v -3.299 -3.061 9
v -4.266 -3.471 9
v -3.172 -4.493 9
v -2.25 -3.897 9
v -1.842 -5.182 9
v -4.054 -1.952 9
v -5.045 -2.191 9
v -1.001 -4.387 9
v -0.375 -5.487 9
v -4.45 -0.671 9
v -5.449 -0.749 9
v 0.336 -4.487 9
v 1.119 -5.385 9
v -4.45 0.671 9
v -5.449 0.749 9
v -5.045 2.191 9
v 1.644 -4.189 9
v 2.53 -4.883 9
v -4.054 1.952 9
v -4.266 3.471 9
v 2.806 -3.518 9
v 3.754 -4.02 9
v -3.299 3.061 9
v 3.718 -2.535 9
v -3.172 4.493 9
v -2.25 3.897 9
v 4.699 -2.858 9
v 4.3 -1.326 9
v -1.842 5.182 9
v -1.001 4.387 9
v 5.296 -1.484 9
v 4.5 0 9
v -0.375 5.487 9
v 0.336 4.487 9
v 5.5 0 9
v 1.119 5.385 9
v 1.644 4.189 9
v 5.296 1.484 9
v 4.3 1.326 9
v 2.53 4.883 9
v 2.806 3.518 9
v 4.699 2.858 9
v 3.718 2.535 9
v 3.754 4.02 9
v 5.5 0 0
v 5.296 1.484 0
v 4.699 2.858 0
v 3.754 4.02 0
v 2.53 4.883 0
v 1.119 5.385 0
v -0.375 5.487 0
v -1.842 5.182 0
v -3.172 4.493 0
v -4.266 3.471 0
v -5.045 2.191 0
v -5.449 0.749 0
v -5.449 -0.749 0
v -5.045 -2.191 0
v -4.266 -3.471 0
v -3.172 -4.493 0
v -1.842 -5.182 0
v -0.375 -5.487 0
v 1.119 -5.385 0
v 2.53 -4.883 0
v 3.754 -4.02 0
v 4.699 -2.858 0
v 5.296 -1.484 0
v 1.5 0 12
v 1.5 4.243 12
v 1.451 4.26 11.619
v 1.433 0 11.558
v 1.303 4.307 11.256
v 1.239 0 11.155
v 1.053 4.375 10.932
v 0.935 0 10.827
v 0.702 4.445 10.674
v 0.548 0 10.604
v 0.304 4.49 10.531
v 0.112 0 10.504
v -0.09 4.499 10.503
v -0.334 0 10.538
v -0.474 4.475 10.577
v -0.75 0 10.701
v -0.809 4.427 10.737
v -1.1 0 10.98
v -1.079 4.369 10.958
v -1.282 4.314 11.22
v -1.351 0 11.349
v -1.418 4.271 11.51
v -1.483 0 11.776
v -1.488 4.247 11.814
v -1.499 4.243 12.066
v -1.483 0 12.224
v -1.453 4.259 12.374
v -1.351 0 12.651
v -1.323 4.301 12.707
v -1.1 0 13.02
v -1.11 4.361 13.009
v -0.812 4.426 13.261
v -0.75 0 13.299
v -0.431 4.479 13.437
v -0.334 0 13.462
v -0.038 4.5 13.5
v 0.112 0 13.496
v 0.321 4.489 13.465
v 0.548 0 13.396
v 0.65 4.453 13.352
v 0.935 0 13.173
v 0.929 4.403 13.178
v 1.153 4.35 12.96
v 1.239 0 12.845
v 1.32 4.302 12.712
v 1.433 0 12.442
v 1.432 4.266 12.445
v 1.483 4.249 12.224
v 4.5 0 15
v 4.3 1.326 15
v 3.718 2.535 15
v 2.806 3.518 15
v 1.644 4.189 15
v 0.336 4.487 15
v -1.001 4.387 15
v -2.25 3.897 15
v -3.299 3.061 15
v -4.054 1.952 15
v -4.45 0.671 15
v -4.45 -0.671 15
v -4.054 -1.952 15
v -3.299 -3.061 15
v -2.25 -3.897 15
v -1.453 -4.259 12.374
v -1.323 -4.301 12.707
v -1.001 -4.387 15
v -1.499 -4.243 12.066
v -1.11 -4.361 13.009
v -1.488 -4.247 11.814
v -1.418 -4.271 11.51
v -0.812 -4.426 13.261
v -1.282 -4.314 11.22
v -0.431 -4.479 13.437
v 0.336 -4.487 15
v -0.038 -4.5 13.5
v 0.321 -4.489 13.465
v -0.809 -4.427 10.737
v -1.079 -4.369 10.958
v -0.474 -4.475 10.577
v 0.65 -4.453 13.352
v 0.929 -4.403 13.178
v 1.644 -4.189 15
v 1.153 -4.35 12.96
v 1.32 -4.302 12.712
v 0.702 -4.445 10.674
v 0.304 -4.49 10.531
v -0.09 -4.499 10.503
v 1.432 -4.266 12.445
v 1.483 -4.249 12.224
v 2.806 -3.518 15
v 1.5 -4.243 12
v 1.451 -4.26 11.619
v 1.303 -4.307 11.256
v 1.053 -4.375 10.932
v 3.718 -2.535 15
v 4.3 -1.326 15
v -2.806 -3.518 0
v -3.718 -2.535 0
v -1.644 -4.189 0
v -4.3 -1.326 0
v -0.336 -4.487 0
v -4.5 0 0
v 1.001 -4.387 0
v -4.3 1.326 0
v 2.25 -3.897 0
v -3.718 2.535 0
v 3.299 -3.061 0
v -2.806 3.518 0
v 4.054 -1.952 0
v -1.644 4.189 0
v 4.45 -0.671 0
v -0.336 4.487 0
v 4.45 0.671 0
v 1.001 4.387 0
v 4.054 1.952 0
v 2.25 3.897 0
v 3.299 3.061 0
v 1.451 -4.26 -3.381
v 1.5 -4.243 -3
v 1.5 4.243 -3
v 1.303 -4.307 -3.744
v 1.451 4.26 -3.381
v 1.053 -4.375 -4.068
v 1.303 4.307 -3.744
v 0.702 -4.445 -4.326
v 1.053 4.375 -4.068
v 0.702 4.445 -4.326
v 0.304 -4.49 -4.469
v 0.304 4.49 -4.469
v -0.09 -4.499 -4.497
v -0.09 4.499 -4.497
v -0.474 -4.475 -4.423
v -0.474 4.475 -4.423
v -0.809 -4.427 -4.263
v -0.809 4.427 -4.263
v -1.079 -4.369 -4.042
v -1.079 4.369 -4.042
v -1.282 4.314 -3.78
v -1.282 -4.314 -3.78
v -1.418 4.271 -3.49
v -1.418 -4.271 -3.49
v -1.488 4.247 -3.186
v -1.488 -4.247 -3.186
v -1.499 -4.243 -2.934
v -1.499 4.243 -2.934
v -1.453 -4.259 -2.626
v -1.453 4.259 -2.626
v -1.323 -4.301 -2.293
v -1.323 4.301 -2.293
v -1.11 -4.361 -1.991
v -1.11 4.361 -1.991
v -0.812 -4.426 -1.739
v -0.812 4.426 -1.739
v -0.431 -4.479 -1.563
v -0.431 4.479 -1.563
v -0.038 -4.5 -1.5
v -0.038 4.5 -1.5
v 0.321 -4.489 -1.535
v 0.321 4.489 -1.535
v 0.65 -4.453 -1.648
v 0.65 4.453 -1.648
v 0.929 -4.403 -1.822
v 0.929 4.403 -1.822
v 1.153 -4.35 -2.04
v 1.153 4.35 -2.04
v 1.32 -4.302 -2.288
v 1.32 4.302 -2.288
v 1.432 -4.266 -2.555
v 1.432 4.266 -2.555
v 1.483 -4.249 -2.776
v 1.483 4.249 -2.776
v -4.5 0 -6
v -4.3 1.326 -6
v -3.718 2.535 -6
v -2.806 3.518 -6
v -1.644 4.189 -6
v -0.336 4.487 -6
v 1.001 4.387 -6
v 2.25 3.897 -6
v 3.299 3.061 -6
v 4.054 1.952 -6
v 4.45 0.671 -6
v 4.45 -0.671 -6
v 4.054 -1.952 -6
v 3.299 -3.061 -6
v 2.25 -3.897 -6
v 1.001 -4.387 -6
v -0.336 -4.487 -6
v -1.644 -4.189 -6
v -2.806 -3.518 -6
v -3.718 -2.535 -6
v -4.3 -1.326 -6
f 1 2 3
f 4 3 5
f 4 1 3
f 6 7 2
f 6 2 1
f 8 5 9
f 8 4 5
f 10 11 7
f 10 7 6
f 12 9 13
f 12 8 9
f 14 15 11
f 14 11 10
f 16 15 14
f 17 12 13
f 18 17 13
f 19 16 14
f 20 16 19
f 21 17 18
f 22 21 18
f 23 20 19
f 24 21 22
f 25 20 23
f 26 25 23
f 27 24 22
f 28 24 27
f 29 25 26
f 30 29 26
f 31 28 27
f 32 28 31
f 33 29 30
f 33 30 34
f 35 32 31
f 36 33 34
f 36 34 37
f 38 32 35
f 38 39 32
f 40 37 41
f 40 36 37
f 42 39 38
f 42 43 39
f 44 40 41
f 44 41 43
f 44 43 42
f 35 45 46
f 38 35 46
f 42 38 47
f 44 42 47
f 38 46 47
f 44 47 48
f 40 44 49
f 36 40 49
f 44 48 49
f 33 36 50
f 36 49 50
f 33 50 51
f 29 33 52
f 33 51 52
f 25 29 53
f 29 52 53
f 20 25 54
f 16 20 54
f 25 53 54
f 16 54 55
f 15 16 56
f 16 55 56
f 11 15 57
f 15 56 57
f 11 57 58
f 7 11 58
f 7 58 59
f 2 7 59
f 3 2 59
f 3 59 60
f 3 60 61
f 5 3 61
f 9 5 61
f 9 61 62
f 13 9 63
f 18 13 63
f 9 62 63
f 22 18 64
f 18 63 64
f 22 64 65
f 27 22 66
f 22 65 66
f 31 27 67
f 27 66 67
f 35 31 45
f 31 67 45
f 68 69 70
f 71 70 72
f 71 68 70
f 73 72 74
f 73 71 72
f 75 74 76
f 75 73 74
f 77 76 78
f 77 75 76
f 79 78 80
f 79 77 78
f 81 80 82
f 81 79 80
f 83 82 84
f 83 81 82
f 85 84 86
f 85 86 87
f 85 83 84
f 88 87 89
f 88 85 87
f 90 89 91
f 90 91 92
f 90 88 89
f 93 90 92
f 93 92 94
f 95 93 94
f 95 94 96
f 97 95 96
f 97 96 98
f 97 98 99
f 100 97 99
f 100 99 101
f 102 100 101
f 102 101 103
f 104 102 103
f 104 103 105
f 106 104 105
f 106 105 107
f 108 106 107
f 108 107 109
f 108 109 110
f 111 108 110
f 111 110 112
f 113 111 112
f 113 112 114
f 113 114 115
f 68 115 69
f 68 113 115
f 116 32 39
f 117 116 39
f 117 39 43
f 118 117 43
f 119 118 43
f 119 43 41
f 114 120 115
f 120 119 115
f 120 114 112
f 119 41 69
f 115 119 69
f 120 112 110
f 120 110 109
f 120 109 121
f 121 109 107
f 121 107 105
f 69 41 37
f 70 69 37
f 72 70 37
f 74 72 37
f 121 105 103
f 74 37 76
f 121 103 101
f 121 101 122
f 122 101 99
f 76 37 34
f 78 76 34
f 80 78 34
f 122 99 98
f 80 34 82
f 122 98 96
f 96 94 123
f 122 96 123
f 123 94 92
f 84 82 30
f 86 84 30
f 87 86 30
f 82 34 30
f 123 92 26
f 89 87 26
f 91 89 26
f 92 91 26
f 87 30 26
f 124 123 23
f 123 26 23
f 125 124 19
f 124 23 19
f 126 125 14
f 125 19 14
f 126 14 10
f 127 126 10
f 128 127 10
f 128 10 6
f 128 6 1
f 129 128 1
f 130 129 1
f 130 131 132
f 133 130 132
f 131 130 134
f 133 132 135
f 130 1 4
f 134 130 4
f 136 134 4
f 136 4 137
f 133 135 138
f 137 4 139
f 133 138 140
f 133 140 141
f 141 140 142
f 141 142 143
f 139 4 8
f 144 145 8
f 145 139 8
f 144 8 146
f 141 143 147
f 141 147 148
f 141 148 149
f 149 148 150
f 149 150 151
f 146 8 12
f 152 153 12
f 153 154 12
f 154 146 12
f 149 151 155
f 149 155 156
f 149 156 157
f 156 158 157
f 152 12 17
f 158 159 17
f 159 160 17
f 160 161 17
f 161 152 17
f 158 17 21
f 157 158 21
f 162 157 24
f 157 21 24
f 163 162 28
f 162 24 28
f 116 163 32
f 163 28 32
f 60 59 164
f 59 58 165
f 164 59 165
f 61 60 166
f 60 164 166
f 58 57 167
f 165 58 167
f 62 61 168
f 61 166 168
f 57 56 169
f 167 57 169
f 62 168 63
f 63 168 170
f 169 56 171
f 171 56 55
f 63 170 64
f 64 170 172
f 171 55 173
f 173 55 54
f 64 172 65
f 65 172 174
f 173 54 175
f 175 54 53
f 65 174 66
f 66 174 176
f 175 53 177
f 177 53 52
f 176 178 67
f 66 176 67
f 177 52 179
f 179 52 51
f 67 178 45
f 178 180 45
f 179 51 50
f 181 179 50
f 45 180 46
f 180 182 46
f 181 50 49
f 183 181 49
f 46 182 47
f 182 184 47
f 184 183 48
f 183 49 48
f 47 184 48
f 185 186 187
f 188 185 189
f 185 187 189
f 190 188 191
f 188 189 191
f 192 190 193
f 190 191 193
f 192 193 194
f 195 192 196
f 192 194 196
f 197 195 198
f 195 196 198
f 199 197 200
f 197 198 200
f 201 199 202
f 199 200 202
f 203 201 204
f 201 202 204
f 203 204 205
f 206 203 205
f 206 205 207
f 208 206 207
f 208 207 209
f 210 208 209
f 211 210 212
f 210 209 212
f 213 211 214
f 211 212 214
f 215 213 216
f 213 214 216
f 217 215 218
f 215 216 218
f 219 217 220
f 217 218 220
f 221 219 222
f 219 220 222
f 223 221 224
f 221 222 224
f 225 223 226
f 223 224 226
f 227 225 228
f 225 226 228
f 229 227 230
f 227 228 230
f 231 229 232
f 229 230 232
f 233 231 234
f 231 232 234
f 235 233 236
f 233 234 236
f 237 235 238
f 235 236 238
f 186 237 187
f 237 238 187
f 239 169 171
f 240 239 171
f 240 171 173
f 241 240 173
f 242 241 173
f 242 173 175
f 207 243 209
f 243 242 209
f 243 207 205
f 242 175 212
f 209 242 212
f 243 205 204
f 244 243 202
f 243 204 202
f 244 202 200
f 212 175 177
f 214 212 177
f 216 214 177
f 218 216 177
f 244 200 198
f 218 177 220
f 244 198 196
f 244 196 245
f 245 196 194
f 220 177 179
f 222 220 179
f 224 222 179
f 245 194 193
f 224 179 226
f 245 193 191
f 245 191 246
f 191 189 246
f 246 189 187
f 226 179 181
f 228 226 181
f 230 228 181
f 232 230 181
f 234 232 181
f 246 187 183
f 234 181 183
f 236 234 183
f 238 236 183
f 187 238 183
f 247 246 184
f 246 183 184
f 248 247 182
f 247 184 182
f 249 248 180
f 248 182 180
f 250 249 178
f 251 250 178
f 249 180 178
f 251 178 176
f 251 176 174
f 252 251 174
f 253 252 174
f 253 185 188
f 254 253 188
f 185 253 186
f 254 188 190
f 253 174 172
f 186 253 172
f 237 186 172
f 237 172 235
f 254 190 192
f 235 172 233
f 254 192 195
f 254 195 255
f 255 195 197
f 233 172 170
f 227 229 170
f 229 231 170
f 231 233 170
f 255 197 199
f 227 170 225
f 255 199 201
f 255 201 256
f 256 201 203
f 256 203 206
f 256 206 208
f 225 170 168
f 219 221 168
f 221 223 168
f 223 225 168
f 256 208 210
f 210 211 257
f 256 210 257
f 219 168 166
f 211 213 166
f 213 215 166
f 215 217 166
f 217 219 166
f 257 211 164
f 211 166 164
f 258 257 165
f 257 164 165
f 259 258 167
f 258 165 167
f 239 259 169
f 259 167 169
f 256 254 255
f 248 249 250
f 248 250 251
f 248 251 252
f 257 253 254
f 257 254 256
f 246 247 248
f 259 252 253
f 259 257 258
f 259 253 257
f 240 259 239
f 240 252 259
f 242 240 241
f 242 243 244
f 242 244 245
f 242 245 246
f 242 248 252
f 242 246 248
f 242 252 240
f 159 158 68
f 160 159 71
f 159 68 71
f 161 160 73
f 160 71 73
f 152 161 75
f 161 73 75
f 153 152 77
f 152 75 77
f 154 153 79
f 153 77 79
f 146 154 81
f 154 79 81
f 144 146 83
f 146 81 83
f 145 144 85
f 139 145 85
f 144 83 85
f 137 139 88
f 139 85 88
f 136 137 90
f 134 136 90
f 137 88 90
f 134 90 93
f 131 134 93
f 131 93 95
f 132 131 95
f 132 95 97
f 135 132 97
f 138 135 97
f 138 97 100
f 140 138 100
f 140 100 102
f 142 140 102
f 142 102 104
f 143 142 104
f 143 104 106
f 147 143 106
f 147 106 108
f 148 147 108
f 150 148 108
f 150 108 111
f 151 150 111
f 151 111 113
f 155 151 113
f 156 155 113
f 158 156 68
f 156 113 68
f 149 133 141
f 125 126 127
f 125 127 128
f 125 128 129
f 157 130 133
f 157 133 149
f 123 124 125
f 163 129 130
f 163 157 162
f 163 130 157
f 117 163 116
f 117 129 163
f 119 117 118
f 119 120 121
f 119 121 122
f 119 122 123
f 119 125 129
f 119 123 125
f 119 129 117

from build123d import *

# Parameters (mm, degrees)
SKETCH1_R               = 5.5
BOSS_EXTRUDE1_DEPTH     = 9
SKETCH2_R               = 4.5
BOSS_EXTRUDE2_DEPTH     = 6
SKETCH3_R               = 4.5
BOSS_EXTRUDE3_DEPTH     = 6
SKETCH4_R               = 1.5
CUT_EXTRUDE1_DEPTH      = 6.5
CUT_EXTRUDE1_DEPTH_BACK = 6.5


with BuildPart() as part:
    # Sketch1 → Boss-Extrude1 (new body)
    with BuildSketch(Plane.XY):
        Circle(SKETCH1_R)
    extrude(amount=BOSS_EXTRUDE1_DEPTH)

    # Sketch2 → Boss-Extrude2 (add)
    with BuildSketch(Plane.XY.offset(9)):
        Circle(SKETCH2_R)
    extrude(amount=BOSS_EXTRUDE2_DEPTH)

    # Sketch3 → Boss-Extrude3 (add)
    with BuildSketch(Plane(origin=(0, 0, 0), x_dir=(-1, 0, 0), z_dir=(0, 0, -1))):
        Circle(SKETCH3_R)
    extrude(amount=BOSS_EXTRUDE3_DEPTH)

    # Sketch4 → Cut-Extrude1 (cut, two sides)
    with BuildSketch(Plane(origin=(0, 0, 0), x_dir=(1, 0, 0), z_dir=(0, 1, 0))) as cut_extrude1_sk:
        with Locations((0, 3)):
            Circle(SKETCH4_R)
        with Locations((0, -12)):
            Circle(SKETCH4_R)
    extrude(amount=CUT_EXTRUDE1_DEPTH, mode=Mode.SUBTRACT)
    extrude(cut_extrude1_sk.sketch, amount=-CUT_EXTRUDE1_DEPTH_BACK, mode=Mode.SUBTRACT)


solid = part.part
